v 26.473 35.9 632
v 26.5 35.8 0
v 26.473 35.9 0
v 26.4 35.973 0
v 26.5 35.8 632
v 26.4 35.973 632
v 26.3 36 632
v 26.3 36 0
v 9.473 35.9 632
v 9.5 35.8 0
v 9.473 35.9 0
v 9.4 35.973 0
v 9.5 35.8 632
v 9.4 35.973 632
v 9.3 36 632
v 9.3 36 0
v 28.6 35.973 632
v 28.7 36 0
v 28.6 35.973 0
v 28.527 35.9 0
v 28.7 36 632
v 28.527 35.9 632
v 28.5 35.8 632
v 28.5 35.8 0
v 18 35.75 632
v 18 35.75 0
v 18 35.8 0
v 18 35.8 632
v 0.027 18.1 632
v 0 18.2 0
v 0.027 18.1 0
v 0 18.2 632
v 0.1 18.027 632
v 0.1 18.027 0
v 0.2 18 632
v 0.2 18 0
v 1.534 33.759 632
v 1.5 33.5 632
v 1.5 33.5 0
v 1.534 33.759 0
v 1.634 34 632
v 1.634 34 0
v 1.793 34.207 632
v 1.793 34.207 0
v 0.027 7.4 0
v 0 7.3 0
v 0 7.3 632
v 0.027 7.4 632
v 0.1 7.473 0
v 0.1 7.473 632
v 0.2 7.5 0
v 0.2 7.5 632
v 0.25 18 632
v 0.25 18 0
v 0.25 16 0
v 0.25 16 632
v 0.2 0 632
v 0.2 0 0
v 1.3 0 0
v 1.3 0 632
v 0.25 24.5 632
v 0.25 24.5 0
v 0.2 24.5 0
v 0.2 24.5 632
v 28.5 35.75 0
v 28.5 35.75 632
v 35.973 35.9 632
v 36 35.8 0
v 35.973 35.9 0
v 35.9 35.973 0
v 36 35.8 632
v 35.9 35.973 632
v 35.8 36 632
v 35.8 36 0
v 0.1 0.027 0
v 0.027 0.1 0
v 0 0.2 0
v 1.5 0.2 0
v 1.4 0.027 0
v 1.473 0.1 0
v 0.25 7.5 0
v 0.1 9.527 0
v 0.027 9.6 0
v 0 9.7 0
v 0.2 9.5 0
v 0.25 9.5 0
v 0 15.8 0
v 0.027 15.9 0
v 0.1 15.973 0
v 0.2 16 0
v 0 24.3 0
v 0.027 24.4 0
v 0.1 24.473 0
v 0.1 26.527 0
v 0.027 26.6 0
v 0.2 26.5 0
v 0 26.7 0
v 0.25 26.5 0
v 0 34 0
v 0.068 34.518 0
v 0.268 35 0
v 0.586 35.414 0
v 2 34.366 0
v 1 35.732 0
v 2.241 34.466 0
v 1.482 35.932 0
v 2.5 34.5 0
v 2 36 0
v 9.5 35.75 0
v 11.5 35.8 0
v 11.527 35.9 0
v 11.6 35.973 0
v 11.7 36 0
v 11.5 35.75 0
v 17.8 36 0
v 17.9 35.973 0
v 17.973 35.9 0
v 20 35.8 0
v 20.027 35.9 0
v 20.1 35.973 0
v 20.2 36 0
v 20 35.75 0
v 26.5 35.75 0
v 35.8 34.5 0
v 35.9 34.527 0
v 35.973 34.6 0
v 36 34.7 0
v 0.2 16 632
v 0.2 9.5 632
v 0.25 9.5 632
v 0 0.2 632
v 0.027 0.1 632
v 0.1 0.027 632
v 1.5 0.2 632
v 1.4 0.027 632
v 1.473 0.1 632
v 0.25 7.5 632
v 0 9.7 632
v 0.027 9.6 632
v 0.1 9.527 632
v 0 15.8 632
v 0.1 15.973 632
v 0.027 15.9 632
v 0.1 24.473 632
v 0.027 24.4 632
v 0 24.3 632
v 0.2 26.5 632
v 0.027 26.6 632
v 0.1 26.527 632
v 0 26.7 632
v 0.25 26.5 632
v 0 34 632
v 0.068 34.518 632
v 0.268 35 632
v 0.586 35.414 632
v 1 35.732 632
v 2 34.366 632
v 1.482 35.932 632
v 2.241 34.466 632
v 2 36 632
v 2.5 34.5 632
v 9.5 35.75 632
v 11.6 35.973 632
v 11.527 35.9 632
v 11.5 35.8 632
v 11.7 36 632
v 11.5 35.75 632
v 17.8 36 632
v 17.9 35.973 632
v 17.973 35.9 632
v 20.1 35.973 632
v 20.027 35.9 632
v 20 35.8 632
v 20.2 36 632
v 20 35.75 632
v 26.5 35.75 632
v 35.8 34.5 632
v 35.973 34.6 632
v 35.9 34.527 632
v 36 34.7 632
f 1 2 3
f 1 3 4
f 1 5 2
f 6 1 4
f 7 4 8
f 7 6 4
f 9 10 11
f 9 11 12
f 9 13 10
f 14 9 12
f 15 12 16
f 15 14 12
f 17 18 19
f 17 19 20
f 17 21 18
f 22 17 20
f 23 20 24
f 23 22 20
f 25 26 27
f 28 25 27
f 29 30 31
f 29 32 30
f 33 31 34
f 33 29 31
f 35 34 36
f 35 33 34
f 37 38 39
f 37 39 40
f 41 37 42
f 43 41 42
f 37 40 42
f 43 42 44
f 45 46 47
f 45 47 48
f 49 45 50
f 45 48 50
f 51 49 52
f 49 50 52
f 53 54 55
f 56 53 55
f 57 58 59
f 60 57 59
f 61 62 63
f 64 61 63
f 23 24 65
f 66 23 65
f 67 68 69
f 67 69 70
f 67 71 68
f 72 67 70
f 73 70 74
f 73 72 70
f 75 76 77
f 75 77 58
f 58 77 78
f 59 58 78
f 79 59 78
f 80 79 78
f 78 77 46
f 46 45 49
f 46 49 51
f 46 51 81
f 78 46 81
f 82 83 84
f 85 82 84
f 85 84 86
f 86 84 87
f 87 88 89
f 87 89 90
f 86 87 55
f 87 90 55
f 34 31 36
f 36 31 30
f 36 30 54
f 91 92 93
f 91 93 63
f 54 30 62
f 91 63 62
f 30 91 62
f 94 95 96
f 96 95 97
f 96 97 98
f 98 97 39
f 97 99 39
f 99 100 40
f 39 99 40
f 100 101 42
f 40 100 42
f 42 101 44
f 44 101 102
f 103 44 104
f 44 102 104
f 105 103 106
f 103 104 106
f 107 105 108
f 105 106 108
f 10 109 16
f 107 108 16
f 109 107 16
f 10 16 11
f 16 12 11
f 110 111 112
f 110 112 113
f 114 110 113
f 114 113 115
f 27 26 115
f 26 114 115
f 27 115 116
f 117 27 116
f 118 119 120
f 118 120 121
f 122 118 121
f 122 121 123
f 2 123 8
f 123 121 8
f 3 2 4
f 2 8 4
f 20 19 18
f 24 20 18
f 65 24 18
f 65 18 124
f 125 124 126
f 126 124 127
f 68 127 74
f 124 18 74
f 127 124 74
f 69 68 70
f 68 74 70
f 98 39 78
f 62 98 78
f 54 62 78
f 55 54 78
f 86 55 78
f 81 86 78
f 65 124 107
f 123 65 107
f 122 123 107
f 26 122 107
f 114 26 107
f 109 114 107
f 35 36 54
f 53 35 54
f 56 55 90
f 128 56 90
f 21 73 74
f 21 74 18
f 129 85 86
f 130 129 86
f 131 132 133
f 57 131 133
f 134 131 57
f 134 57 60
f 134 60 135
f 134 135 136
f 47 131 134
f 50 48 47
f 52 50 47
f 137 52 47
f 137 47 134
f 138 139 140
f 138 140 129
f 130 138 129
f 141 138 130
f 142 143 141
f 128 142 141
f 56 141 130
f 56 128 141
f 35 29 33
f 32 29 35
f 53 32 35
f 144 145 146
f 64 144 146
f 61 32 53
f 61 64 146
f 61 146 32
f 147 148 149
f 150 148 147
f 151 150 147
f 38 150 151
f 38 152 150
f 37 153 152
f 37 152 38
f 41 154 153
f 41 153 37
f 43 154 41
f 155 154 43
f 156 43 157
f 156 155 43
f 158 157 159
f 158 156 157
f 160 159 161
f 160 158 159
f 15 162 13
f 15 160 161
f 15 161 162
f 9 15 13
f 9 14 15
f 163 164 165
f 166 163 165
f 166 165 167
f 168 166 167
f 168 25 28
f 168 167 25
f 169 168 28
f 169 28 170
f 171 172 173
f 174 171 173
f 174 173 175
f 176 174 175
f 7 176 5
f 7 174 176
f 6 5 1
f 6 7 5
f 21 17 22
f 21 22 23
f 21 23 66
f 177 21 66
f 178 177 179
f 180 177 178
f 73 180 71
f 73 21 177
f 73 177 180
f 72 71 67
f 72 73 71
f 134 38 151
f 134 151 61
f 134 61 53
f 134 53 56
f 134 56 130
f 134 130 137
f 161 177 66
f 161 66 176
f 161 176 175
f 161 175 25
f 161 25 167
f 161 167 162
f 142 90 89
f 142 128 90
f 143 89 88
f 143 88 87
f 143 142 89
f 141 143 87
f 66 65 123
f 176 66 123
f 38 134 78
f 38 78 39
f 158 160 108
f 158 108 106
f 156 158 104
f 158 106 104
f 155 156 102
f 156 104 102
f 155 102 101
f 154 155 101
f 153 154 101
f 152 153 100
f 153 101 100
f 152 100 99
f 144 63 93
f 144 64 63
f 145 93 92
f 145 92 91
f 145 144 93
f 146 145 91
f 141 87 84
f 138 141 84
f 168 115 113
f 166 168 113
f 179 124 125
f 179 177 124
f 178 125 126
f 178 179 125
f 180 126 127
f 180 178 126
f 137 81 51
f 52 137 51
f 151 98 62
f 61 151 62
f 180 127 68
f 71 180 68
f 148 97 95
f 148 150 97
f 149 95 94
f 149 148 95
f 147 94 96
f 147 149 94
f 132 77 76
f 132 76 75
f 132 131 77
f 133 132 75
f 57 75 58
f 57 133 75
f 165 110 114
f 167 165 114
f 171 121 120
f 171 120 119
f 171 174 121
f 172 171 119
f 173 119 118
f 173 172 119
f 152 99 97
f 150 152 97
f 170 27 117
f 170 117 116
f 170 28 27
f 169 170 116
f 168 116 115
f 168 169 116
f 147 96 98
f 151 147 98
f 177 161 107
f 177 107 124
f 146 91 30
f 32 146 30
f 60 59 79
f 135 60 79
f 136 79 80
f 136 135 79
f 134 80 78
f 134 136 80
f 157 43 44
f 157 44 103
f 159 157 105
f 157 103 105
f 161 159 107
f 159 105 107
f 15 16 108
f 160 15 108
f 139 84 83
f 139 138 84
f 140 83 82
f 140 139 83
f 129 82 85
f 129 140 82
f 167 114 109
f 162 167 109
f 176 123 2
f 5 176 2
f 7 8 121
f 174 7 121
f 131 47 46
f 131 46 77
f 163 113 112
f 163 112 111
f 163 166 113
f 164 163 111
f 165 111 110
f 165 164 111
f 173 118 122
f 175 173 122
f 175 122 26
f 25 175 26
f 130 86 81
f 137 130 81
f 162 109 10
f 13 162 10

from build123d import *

# Parameters (mm, degrees)
F1_DEPTH = 632
F2_R     = 0.2


with BuildPart() as f1:
    # F0 (on Top) → F1 (new body)
    with BuildSketch(Plane.XY):
        with BuildLine():
            Line((0, 7.5), (0, 0))
            Line((0, 0), (1.5, 0))
            Line((1.5, 0), (1.5, 33.5))
            ThreePointArc((1.5, 33.5), (1.57612, 33.882683), (1.792893, 34.207107))
            ThreePointArc((1.792893, 34.207107), (2.117317, 34.42388), (2.5, 34.5))
            Line((2.5, 34.5), (36, 34.5))
            Line((36, 34.5), (36, 36))
            Line((36, 36), (28.5, 36))
            Line((28.5, 36), (28.5, 35.75))
            Line((28.5, 35.75), (26.5, 35.75))
            Line((26.5, 35.75), (26.5, 36))
            Line((26.5, 36), (20, 36))
            Line((20, 36), (20, 35.75))
            Line((20, 35.75), (18, 35.75))
            Line((18, 35.75), (18, 36))
            Line((18, 36), (11.5, 36))
            Line((11.5, 36), (11.5, 35.75))
            Line((11.5, 35.75), (9.5, 35.75))
            Line((9.5, 35.75), (9.5, 36))
            Line((9.5, 36), (2, 36))
            ThreePointArc((2, 36), (1.234633, 35.847759), (0.585786, 35.414214))
            ThreePointArc((0.585786, 35.414214), (0.152241, 34.765367), (0, 34))
            Line((0, 34), (0, 26.5))
            Line((0, 26.5), (0.25, 26.5))
            Line((0.25, 26.5), (0.25, 24.5))
            Line((0.25, 24.5), (0, 24.5))
            Line((0, 24.5), (0, 18))
            Line((0, 18), (0.25, 18))
            Line((0.25, 18), (0.25, 16))
            Line((0.25, 16), (0, 16))
            Line((0, 16), (0, 9.5))
            Line((0, 9.5), (0.25, 9.5))
            Line((0.25, 9.5), (0.25, 7.5))
            Line((0.25, 7.5), (0, 7.5))
        make_face()
    extrude(amount=F1_DEPTH)

    # F2
    f2_edges = [f1.edges().sort_by_distance(p)[0] for p in [
        (0, 16, 316),
        (0, 18, 316),
        (0, 9.5, 316),
        (0, 7.5, 316),
        (0, 26.5, 316),
        (0, 24.5, 316),
        (9.5, 36, 316),
        (11.5, 36, 316),
        (18, 36, 316),
        (20, 36, 316),
        (26.5, 36, 316),
        (28.5, 36, 316),
        (36, 36, 316),
        (36, 34.5, 316),
        (0, 0, 316),
        (1.5, 0, 316),
    ]]
    fillet(f2_edges, radius=F2_R)


solid = f1.part
